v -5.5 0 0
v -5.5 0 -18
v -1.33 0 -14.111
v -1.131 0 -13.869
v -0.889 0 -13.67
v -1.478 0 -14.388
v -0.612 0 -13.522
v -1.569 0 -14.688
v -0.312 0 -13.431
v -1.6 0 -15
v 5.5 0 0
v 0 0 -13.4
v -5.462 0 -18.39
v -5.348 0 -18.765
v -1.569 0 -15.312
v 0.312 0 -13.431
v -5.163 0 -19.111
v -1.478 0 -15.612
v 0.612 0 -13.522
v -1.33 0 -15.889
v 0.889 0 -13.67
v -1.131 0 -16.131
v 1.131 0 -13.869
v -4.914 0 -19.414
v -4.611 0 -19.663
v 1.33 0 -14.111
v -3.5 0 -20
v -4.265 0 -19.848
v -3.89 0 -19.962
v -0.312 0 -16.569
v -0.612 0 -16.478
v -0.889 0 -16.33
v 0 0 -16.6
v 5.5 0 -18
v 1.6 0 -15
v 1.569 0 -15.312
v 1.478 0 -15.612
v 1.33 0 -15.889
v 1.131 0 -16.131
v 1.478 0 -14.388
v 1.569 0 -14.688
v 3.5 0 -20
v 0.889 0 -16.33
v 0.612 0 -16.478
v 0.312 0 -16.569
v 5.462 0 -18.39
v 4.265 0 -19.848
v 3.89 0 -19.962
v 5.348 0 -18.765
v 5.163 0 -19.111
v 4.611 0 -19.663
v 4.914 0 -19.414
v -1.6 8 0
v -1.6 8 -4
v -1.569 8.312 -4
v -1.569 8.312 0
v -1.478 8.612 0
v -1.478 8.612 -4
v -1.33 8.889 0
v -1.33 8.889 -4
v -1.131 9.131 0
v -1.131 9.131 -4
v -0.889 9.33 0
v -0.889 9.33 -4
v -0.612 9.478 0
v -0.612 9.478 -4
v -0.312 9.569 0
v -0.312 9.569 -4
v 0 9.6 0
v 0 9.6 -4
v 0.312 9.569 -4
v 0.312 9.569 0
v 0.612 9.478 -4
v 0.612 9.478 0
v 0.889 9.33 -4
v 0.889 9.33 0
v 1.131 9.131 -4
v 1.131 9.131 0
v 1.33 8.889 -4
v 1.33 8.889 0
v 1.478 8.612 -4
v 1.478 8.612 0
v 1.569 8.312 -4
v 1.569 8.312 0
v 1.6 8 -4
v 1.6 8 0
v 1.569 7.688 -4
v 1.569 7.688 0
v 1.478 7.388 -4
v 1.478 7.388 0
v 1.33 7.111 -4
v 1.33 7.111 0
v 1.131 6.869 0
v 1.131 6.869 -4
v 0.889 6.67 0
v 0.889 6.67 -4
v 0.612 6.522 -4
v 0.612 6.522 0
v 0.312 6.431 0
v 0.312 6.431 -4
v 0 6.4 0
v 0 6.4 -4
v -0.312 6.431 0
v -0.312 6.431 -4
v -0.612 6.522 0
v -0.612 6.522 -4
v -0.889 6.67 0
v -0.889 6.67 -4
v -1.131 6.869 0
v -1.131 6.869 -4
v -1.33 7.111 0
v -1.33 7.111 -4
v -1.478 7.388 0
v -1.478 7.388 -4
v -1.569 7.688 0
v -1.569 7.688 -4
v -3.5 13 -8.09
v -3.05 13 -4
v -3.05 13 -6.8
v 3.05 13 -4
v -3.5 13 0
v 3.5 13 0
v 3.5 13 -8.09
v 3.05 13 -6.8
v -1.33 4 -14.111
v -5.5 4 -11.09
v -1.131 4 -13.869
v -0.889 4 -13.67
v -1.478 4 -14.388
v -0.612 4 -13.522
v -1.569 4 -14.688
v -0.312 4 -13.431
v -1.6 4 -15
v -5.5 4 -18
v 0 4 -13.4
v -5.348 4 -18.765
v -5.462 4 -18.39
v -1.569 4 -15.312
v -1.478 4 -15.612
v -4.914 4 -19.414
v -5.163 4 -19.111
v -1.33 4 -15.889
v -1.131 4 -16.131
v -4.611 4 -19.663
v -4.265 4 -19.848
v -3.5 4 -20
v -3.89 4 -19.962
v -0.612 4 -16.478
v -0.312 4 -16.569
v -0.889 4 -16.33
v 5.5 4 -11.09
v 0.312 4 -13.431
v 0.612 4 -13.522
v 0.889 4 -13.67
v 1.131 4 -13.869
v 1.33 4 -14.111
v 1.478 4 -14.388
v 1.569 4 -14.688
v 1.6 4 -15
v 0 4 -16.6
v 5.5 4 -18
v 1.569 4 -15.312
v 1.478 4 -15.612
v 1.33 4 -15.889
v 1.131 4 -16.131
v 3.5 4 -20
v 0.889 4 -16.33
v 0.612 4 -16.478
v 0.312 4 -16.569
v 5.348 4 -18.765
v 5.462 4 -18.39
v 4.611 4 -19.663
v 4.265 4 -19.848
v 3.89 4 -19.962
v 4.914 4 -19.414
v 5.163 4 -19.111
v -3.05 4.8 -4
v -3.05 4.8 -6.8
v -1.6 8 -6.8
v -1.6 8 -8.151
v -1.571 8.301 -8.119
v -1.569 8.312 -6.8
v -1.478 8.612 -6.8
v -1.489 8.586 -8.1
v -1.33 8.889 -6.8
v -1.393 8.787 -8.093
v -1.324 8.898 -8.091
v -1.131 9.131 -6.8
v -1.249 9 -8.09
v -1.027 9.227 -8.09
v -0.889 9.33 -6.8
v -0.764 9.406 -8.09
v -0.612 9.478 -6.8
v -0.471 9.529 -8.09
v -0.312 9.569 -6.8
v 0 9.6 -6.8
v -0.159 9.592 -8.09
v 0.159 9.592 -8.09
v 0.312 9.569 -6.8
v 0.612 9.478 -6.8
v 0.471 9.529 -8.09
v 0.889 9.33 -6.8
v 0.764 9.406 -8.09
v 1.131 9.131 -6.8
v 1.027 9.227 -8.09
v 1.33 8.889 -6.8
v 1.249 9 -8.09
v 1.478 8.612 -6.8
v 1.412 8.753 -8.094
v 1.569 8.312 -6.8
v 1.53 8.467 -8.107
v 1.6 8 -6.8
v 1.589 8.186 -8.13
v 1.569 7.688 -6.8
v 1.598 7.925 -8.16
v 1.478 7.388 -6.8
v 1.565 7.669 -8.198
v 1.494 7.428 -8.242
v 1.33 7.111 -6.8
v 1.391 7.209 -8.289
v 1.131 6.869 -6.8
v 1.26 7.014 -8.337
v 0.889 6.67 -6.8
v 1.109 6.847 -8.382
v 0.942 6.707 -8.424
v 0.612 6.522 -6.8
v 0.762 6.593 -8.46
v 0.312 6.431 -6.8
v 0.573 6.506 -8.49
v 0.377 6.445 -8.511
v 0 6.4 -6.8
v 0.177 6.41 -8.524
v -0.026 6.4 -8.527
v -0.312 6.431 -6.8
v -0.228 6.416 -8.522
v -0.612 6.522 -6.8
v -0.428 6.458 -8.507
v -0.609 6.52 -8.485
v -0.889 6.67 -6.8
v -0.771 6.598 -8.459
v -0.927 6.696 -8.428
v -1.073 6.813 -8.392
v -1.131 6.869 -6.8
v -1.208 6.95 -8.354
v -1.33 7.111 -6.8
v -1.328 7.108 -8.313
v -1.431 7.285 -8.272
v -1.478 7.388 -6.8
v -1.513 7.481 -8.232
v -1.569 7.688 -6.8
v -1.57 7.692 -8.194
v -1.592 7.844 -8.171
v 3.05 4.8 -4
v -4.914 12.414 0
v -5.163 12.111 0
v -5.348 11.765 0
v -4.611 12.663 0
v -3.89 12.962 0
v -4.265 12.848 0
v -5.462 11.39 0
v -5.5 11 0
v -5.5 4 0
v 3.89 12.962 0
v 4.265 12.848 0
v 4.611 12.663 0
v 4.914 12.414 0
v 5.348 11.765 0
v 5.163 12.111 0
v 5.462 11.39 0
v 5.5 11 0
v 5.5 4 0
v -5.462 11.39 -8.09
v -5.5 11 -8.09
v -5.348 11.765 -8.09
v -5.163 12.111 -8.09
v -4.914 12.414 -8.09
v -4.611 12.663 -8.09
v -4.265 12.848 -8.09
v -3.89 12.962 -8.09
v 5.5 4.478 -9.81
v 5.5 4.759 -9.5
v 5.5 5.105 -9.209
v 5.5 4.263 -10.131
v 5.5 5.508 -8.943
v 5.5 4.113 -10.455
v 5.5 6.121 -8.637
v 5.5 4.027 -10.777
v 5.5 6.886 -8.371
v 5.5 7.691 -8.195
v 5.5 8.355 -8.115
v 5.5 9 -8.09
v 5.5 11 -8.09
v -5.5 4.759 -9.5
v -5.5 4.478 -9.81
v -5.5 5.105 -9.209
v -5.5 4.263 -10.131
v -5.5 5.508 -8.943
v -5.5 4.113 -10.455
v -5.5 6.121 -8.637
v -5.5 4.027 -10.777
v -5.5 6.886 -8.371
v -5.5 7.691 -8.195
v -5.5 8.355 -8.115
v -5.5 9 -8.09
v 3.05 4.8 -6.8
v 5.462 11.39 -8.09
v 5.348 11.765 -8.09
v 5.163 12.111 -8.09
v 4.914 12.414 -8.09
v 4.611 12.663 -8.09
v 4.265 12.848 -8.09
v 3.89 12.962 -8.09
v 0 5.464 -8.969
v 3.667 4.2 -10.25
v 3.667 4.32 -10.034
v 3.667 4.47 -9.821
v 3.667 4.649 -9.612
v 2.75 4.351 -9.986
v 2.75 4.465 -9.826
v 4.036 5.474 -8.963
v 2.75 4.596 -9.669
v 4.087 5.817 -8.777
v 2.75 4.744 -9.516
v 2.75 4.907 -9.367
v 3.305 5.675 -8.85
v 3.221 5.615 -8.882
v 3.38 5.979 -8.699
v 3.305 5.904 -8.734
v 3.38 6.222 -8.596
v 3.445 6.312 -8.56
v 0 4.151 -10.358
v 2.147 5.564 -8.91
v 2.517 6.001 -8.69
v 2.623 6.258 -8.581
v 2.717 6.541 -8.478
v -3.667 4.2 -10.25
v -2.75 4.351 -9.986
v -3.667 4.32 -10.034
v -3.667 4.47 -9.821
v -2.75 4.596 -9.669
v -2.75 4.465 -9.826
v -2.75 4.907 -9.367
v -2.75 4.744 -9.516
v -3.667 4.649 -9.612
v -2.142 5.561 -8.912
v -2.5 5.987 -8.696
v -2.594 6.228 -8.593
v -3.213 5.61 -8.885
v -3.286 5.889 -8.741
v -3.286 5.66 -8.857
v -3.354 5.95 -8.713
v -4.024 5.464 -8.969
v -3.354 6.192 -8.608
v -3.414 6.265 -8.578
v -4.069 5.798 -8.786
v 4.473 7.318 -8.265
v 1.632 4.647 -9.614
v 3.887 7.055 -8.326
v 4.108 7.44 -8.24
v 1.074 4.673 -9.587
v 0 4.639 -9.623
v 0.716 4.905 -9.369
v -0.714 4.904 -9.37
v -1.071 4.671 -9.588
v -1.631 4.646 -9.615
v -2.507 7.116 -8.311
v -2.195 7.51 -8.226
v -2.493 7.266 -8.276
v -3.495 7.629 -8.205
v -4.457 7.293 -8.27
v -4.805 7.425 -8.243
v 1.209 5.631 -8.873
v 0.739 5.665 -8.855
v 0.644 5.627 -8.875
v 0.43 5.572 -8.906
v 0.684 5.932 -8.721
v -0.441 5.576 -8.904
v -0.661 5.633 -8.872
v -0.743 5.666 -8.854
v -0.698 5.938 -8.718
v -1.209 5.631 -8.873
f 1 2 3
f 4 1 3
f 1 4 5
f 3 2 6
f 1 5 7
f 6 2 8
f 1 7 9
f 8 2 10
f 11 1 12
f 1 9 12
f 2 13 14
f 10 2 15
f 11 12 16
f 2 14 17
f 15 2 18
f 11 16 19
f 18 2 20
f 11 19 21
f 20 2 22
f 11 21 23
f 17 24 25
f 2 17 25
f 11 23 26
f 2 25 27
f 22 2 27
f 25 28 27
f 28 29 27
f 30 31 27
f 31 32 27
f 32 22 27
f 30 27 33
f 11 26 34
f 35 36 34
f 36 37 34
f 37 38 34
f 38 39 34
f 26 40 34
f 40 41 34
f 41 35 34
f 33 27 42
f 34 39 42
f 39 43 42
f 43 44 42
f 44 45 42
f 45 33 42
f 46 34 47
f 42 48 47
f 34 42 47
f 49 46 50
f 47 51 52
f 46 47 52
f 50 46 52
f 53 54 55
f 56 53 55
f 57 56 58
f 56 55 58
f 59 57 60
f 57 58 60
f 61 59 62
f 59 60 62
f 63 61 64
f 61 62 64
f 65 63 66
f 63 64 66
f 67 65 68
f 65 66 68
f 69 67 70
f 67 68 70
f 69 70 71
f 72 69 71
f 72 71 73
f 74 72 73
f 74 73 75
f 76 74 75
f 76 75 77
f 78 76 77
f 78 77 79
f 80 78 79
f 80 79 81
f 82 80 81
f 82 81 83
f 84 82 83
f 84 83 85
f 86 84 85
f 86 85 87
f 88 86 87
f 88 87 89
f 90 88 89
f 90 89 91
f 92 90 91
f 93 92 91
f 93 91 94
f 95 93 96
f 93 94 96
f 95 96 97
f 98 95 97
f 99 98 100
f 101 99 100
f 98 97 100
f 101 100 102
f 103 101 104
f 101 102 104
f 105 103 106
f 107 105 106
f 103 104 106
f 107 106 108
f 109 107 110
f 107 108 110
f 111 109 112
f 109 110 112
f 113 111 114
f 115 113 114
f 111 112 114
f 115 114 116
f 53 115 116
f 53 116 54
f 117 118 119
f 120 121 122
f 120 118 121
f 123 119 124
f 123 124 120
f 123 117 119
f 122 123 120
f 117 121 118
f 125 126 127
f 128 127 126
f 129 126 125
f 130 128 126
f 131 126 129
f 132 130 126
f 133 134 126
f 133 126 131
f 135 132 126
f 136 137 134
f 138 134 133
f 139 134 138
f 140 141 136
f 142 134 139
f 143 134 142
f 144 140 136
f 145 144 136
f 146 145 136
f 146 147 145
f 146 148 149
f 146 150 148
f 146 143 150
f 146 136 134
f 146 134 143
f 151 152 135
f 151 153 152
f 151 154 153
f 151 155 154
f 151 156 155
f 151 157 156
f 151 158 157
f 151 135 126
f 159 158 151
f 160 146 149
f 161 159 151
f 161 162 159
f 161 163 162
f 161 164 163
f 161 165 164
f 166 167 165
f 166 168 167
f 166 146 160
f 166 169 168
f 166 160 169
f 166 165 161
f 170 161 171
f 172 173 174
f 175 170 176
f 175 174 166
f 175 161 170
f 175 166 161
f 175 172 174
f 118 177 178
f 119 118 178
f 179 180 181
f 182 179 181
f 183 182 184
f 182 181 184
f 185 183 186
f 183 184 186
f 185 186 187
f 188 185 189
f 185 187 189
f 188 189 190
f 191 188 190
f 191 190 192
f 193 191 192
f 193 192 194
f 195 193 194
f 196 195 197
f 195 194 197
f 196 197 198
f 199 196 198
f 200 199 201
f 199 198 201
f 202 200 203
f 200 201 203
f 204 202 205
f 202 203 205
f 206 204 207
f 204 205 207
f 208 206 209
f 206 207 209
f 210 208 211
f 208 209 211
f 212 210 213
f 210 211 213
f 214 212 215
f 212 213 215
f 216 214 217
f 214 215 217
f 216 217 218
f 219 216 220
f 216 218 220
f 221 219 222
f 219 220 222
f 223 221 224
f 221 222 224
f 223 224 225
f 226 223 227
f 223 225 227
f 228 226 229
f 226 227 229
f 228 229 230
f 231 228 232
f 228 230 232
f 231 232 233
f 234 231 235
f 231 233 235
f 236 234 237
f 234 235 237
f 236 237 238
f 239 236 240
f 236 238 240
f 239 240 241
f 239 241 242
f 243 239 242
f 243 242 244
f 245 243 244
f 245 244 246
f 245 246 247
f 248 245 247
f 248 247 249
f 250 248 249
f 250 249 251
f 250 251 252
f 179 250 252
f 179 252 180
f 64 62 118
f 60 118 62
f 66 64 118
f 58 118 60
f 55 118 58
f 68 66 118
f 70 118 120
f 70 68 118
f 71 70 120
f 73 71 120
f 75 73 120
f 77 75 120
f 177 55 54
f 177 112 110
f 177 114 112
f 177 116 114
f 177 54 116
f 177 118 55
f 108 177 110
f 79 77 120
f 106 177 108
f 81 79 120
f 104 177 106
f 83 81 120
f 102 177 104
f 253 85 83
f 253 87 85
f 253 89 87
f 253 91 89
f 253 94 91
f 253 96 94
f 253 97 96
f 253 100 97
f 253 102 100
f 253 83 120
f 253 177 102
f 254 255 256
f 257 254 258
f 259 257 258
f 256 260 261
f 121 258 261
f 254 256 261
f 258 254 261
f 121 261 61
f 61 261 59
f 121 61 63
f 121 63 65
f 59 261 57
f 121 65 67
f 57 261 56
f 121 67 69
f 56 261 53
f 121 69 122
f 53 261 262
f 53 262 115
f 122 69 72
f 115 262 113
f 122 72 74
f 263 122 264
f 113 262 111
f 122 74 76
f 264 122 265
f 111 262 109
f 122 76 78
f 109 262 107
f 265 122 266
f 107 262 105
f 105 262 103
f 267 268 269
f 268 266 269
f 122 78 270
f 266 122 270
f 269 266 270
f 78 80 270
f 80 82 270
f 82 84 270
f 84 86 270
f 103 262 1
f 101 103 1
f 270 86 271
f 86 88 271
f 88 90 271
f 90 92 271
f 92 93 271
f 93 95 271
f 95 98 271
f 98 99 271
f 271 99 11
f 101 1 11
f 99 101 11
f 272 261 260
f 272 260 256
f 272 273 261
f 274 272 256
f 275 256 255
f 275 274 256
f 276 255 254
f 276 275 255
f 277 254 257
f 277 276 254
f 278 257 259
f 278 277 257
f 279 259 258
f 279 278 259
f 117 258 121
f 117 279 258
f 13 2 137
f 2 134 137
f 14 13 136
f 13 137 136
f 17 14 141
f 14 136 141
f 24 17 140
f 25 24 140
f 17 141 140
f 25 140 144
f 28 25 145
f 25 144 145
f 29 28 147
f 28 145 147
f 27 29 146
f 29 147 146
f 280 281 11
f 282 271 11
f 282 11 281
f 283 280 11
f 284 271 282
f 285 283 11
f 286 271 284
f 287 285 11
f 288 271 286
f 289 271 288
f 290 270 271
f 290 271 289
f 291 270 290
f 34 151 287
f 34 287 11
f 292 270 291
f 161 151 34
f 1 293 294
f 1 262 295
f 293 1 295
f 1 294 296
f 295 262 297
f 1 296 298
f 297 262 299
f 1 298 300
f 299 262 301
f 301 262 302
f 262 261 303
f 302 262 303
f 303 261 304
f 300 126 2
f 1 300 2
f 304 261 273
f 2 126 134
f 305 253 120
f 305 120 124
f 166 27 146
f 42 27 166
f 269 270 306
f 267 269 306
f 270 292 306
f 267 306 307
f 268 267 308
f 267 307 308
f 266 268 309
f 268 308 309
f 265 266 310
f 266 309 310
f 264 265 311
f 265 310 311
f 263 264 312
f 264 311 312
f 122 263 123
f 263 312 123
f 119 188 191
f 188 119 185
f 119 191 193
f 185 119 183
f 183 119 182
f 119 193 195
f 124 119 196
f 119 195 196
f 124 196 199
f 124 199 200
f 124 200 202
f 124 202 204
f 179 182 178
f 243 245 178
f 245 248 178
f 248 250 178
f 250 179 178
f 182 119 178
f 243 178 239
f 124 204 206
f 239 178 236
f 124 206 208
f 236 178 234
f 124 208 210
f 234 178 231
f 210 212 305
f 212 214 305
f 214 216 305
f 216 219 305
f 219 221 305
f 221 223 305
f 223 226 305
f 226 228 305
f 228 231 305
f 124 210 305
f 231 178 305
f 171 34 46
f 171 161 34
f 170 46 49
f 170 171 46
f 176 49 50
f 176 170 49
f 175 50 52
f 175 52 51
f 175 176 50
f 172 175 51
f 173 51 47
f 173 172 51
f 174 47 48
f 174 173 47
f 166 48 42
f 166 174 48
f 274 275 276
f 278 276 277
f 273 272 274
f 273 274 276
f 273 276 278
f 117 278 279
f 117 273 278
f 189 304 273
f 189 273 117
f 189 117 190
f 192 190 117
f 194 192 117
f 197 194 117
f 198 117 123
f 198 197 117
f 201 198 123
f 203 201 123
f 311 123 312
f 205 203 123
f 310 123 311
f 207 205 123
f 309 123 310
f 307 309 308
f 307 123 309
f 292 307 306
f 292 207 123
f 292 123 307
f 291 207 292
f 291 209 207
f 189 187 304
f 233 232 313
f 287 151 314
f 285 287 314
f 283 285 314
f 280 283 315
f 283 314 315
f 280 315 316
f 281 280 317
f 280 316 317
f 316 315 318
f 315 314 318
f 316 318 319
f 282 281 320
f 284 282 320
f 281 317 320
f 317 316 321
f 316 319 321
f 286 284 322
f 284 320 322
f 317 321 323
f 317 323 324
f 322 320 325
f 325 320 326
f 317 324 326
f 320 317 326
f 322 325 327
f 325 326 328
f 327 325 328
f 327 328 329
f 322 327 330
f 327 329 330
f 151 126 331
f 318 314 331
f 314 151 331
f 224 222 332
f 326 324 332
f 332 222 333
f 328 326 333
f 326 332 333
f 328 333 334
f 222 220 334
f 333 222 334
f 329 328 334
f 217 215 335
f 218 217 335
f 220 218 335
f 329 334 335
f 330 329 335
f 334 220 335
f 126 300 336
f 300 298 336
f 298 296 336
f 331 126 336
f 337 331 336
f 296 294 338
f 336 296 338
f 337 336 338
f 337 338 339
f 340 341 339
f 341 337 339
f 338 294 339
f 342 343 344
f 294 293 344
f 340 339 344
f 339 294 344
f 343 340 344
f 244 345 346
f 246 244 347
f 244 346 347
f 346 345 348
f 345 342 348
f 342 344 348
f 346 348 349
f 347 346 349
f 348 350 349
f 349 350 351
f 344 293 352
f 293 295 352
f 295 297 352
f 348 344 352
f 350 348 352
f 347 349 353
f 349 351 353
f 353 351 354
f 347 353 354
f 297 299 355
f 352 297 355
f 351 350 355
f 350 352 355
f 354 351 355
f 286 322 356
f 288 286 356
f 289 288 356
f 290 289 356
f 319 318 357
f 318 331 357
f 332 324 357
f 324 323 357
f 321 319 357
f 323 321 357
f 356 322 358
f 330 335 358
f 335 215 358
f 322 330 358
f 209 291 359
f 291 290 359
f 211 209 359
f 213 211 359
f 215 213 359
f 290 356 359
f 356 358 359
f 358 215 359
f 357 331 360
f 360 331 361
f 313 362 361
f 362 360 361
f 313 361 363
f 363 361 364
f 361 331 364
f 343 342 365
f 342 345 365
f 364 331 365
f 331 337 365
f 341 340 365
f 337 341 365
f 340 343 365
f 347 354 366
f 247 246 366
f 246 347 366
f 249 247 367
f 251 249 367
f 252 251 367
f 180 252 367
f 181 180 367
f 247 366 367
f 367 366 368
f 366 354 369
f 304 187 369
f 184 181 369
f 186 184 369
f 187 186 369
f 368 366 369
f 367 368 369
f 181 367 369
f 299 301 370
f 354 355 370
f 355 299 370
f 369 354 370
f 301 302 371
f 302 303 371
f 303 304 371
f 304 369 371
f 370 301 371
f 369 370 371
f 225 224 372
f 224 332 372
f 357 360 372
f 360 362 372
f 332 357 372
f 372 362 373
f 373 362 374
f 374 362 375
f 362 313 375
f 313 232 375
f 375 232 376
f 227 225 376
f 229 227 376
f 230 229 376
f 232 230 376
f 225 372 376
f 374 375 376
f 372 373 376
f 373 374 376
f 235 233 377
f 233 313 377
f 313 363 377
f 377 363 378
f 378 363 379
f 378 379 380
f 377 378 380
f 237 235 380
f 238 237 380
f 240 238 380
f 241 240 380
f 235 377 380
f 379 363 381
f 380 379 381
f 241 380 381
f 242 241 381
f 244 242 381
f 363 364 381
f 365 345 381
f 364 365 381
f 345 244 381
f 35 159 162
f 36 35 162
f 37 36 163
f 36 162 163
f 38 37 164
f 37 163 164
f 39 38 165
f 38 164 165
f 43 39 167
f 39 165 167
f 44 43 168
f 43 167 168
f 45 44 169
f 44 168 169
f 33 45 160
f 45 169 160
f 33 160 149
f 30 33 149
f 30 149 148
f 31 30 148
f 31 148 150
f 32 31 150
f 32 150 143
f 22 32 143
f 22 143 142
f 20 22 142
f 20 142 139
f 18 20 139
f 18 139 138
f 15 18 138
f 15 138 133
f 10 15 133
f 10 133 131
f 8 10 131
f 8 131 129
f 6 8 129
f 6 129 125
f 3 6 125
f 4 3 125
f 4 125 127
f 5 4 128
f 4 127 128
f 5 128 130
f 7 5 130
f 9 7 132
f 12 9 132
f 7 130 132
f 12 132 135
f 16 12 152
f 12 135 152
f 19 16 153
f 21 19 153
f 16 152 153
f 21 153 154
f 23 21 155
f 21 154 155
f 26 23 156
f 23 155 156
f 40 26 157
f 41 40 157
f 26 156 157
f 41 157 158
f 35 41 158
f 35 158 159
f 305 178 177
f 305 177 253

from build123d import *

# Parameters (mm, degrees)
SKETCH1_W                   = 11
SKETCH1_H                   = 20
BASE_DEPTH                  = 4
SKETCH1_3_W                 = 11
SKETCH1_3_H                 = 8.089952371
SKETCH1_3_W_2               = 6.1
SKETCH1_3_H_2               = 2.8
VERTICALPIECE_DEPTH         = 13
FILLETCORNER_SIZE           = 3
FILLETCORNER_SIZE_2         = 5
F_3_2_3_2_HORIZONTAL_HOLE_D = 3.2
F_3_2_3_2_VERTICAL_HOLE_D   = 3.2
SKETCH1_4_W                 = 6.1
SKETCH1_4_H                 = 2.8
NUTSLOT_DEPTH               = 4.8
FILLET2_R                   = 2


with BuildPart() as part:
    # Sketch1 → Base (new body)
    with BuildSketch(Plane(origin=(0, 0, 0), x_dir=(1, 0, 0), z_dir=(0, 1, 0))):
        with Locations((0, 10)):
            Rectangle(SKETCH1_W, SKETCH1_H)
    extrude(amount=BASE_DEPTH)

    # Sketch1<3> → VerticalPiece (add)
    with BuildSketch(Plane(origin=(0, 0, 0), x_dir=(1, 0, 0), z_dir=(0, 1, 0))):
        with Locations((0, 4.044976186)):
            Rectangle(SKETCH1_3_W, SKETCH1_3_H)
        with Locations((0, 5.4)):
            Rectangle(SKETCH1_3_W_2, SKETCH1_3_H_2, mode=Mode.SUBTRACT)
    extrude(amount=VERTICALPIECE_DEPTH)

    # FilletCorner
    # an asymmetric fillet: 5, 3 mm, written as the material it adds along each edge
    with BuildSketch(Plane(origin=(-5.5, 4, -8.089952371), x_dir=(0, 0, -1), z_dir=(1, 0, 0))) as filletcorner_piece_1:
        with BuildLine():
            Bezier((FILLETCORNER_SIZE, 0), (0, 0), (0, FILLETCORNER_SIZE_2), weights=[1, 0.707106781, 1])
            Line((0, FILLETCORNER_SIZE_2), (0, 0))
            Line((0, 0), (FILLETCORNER_SIZE, 0))
        make_face()
    extrude(amount=11)

    # Ø3.2 (3.2) Horizontal Hole (through all)
    with Locations(Plane(origin=(0, 0, 0), x_dir=(-1, 0, 0), z_dir=(0, -1, 0))):
        with Locations((0, 15)):
            Hole(F_3_2_3_2_HORIZONTAL_HOLE_D / 2)

    # Ø3.2 (3.2) Vertical Hole (through all)
    with Locations(Plane.XY):
        with Locations((0, 8)):
            Hole(F_3_2_3_2_VERTICAL_HOLE_D / 2)

    # Sketch1<4> → NutSlot (add)
    with BuildSketch(Plane(origin=(0, 0, 0), x_dir=(1, 0, 0), z_dir=(0, 1, 0))):
        with Locations((0, 5.4)):
            Rectangle(SKETCH1_4_W, SKETCH1_4_H)
    extrude(amount=NUTSLOT_DEPTH)

    # Fillet2
    fillet2_edges = [part.edges().sort_by_distance(p)[0] for p in [
        (5.5, 2, -20),
        (-5.5, 2, -20),
        (-5.5, 13, -4.044976185),
        (5.5, 13, -4.044976185),
    ]]
    fillet(fillet2_edges, radius=FILLET2_R)


solid = part.part
